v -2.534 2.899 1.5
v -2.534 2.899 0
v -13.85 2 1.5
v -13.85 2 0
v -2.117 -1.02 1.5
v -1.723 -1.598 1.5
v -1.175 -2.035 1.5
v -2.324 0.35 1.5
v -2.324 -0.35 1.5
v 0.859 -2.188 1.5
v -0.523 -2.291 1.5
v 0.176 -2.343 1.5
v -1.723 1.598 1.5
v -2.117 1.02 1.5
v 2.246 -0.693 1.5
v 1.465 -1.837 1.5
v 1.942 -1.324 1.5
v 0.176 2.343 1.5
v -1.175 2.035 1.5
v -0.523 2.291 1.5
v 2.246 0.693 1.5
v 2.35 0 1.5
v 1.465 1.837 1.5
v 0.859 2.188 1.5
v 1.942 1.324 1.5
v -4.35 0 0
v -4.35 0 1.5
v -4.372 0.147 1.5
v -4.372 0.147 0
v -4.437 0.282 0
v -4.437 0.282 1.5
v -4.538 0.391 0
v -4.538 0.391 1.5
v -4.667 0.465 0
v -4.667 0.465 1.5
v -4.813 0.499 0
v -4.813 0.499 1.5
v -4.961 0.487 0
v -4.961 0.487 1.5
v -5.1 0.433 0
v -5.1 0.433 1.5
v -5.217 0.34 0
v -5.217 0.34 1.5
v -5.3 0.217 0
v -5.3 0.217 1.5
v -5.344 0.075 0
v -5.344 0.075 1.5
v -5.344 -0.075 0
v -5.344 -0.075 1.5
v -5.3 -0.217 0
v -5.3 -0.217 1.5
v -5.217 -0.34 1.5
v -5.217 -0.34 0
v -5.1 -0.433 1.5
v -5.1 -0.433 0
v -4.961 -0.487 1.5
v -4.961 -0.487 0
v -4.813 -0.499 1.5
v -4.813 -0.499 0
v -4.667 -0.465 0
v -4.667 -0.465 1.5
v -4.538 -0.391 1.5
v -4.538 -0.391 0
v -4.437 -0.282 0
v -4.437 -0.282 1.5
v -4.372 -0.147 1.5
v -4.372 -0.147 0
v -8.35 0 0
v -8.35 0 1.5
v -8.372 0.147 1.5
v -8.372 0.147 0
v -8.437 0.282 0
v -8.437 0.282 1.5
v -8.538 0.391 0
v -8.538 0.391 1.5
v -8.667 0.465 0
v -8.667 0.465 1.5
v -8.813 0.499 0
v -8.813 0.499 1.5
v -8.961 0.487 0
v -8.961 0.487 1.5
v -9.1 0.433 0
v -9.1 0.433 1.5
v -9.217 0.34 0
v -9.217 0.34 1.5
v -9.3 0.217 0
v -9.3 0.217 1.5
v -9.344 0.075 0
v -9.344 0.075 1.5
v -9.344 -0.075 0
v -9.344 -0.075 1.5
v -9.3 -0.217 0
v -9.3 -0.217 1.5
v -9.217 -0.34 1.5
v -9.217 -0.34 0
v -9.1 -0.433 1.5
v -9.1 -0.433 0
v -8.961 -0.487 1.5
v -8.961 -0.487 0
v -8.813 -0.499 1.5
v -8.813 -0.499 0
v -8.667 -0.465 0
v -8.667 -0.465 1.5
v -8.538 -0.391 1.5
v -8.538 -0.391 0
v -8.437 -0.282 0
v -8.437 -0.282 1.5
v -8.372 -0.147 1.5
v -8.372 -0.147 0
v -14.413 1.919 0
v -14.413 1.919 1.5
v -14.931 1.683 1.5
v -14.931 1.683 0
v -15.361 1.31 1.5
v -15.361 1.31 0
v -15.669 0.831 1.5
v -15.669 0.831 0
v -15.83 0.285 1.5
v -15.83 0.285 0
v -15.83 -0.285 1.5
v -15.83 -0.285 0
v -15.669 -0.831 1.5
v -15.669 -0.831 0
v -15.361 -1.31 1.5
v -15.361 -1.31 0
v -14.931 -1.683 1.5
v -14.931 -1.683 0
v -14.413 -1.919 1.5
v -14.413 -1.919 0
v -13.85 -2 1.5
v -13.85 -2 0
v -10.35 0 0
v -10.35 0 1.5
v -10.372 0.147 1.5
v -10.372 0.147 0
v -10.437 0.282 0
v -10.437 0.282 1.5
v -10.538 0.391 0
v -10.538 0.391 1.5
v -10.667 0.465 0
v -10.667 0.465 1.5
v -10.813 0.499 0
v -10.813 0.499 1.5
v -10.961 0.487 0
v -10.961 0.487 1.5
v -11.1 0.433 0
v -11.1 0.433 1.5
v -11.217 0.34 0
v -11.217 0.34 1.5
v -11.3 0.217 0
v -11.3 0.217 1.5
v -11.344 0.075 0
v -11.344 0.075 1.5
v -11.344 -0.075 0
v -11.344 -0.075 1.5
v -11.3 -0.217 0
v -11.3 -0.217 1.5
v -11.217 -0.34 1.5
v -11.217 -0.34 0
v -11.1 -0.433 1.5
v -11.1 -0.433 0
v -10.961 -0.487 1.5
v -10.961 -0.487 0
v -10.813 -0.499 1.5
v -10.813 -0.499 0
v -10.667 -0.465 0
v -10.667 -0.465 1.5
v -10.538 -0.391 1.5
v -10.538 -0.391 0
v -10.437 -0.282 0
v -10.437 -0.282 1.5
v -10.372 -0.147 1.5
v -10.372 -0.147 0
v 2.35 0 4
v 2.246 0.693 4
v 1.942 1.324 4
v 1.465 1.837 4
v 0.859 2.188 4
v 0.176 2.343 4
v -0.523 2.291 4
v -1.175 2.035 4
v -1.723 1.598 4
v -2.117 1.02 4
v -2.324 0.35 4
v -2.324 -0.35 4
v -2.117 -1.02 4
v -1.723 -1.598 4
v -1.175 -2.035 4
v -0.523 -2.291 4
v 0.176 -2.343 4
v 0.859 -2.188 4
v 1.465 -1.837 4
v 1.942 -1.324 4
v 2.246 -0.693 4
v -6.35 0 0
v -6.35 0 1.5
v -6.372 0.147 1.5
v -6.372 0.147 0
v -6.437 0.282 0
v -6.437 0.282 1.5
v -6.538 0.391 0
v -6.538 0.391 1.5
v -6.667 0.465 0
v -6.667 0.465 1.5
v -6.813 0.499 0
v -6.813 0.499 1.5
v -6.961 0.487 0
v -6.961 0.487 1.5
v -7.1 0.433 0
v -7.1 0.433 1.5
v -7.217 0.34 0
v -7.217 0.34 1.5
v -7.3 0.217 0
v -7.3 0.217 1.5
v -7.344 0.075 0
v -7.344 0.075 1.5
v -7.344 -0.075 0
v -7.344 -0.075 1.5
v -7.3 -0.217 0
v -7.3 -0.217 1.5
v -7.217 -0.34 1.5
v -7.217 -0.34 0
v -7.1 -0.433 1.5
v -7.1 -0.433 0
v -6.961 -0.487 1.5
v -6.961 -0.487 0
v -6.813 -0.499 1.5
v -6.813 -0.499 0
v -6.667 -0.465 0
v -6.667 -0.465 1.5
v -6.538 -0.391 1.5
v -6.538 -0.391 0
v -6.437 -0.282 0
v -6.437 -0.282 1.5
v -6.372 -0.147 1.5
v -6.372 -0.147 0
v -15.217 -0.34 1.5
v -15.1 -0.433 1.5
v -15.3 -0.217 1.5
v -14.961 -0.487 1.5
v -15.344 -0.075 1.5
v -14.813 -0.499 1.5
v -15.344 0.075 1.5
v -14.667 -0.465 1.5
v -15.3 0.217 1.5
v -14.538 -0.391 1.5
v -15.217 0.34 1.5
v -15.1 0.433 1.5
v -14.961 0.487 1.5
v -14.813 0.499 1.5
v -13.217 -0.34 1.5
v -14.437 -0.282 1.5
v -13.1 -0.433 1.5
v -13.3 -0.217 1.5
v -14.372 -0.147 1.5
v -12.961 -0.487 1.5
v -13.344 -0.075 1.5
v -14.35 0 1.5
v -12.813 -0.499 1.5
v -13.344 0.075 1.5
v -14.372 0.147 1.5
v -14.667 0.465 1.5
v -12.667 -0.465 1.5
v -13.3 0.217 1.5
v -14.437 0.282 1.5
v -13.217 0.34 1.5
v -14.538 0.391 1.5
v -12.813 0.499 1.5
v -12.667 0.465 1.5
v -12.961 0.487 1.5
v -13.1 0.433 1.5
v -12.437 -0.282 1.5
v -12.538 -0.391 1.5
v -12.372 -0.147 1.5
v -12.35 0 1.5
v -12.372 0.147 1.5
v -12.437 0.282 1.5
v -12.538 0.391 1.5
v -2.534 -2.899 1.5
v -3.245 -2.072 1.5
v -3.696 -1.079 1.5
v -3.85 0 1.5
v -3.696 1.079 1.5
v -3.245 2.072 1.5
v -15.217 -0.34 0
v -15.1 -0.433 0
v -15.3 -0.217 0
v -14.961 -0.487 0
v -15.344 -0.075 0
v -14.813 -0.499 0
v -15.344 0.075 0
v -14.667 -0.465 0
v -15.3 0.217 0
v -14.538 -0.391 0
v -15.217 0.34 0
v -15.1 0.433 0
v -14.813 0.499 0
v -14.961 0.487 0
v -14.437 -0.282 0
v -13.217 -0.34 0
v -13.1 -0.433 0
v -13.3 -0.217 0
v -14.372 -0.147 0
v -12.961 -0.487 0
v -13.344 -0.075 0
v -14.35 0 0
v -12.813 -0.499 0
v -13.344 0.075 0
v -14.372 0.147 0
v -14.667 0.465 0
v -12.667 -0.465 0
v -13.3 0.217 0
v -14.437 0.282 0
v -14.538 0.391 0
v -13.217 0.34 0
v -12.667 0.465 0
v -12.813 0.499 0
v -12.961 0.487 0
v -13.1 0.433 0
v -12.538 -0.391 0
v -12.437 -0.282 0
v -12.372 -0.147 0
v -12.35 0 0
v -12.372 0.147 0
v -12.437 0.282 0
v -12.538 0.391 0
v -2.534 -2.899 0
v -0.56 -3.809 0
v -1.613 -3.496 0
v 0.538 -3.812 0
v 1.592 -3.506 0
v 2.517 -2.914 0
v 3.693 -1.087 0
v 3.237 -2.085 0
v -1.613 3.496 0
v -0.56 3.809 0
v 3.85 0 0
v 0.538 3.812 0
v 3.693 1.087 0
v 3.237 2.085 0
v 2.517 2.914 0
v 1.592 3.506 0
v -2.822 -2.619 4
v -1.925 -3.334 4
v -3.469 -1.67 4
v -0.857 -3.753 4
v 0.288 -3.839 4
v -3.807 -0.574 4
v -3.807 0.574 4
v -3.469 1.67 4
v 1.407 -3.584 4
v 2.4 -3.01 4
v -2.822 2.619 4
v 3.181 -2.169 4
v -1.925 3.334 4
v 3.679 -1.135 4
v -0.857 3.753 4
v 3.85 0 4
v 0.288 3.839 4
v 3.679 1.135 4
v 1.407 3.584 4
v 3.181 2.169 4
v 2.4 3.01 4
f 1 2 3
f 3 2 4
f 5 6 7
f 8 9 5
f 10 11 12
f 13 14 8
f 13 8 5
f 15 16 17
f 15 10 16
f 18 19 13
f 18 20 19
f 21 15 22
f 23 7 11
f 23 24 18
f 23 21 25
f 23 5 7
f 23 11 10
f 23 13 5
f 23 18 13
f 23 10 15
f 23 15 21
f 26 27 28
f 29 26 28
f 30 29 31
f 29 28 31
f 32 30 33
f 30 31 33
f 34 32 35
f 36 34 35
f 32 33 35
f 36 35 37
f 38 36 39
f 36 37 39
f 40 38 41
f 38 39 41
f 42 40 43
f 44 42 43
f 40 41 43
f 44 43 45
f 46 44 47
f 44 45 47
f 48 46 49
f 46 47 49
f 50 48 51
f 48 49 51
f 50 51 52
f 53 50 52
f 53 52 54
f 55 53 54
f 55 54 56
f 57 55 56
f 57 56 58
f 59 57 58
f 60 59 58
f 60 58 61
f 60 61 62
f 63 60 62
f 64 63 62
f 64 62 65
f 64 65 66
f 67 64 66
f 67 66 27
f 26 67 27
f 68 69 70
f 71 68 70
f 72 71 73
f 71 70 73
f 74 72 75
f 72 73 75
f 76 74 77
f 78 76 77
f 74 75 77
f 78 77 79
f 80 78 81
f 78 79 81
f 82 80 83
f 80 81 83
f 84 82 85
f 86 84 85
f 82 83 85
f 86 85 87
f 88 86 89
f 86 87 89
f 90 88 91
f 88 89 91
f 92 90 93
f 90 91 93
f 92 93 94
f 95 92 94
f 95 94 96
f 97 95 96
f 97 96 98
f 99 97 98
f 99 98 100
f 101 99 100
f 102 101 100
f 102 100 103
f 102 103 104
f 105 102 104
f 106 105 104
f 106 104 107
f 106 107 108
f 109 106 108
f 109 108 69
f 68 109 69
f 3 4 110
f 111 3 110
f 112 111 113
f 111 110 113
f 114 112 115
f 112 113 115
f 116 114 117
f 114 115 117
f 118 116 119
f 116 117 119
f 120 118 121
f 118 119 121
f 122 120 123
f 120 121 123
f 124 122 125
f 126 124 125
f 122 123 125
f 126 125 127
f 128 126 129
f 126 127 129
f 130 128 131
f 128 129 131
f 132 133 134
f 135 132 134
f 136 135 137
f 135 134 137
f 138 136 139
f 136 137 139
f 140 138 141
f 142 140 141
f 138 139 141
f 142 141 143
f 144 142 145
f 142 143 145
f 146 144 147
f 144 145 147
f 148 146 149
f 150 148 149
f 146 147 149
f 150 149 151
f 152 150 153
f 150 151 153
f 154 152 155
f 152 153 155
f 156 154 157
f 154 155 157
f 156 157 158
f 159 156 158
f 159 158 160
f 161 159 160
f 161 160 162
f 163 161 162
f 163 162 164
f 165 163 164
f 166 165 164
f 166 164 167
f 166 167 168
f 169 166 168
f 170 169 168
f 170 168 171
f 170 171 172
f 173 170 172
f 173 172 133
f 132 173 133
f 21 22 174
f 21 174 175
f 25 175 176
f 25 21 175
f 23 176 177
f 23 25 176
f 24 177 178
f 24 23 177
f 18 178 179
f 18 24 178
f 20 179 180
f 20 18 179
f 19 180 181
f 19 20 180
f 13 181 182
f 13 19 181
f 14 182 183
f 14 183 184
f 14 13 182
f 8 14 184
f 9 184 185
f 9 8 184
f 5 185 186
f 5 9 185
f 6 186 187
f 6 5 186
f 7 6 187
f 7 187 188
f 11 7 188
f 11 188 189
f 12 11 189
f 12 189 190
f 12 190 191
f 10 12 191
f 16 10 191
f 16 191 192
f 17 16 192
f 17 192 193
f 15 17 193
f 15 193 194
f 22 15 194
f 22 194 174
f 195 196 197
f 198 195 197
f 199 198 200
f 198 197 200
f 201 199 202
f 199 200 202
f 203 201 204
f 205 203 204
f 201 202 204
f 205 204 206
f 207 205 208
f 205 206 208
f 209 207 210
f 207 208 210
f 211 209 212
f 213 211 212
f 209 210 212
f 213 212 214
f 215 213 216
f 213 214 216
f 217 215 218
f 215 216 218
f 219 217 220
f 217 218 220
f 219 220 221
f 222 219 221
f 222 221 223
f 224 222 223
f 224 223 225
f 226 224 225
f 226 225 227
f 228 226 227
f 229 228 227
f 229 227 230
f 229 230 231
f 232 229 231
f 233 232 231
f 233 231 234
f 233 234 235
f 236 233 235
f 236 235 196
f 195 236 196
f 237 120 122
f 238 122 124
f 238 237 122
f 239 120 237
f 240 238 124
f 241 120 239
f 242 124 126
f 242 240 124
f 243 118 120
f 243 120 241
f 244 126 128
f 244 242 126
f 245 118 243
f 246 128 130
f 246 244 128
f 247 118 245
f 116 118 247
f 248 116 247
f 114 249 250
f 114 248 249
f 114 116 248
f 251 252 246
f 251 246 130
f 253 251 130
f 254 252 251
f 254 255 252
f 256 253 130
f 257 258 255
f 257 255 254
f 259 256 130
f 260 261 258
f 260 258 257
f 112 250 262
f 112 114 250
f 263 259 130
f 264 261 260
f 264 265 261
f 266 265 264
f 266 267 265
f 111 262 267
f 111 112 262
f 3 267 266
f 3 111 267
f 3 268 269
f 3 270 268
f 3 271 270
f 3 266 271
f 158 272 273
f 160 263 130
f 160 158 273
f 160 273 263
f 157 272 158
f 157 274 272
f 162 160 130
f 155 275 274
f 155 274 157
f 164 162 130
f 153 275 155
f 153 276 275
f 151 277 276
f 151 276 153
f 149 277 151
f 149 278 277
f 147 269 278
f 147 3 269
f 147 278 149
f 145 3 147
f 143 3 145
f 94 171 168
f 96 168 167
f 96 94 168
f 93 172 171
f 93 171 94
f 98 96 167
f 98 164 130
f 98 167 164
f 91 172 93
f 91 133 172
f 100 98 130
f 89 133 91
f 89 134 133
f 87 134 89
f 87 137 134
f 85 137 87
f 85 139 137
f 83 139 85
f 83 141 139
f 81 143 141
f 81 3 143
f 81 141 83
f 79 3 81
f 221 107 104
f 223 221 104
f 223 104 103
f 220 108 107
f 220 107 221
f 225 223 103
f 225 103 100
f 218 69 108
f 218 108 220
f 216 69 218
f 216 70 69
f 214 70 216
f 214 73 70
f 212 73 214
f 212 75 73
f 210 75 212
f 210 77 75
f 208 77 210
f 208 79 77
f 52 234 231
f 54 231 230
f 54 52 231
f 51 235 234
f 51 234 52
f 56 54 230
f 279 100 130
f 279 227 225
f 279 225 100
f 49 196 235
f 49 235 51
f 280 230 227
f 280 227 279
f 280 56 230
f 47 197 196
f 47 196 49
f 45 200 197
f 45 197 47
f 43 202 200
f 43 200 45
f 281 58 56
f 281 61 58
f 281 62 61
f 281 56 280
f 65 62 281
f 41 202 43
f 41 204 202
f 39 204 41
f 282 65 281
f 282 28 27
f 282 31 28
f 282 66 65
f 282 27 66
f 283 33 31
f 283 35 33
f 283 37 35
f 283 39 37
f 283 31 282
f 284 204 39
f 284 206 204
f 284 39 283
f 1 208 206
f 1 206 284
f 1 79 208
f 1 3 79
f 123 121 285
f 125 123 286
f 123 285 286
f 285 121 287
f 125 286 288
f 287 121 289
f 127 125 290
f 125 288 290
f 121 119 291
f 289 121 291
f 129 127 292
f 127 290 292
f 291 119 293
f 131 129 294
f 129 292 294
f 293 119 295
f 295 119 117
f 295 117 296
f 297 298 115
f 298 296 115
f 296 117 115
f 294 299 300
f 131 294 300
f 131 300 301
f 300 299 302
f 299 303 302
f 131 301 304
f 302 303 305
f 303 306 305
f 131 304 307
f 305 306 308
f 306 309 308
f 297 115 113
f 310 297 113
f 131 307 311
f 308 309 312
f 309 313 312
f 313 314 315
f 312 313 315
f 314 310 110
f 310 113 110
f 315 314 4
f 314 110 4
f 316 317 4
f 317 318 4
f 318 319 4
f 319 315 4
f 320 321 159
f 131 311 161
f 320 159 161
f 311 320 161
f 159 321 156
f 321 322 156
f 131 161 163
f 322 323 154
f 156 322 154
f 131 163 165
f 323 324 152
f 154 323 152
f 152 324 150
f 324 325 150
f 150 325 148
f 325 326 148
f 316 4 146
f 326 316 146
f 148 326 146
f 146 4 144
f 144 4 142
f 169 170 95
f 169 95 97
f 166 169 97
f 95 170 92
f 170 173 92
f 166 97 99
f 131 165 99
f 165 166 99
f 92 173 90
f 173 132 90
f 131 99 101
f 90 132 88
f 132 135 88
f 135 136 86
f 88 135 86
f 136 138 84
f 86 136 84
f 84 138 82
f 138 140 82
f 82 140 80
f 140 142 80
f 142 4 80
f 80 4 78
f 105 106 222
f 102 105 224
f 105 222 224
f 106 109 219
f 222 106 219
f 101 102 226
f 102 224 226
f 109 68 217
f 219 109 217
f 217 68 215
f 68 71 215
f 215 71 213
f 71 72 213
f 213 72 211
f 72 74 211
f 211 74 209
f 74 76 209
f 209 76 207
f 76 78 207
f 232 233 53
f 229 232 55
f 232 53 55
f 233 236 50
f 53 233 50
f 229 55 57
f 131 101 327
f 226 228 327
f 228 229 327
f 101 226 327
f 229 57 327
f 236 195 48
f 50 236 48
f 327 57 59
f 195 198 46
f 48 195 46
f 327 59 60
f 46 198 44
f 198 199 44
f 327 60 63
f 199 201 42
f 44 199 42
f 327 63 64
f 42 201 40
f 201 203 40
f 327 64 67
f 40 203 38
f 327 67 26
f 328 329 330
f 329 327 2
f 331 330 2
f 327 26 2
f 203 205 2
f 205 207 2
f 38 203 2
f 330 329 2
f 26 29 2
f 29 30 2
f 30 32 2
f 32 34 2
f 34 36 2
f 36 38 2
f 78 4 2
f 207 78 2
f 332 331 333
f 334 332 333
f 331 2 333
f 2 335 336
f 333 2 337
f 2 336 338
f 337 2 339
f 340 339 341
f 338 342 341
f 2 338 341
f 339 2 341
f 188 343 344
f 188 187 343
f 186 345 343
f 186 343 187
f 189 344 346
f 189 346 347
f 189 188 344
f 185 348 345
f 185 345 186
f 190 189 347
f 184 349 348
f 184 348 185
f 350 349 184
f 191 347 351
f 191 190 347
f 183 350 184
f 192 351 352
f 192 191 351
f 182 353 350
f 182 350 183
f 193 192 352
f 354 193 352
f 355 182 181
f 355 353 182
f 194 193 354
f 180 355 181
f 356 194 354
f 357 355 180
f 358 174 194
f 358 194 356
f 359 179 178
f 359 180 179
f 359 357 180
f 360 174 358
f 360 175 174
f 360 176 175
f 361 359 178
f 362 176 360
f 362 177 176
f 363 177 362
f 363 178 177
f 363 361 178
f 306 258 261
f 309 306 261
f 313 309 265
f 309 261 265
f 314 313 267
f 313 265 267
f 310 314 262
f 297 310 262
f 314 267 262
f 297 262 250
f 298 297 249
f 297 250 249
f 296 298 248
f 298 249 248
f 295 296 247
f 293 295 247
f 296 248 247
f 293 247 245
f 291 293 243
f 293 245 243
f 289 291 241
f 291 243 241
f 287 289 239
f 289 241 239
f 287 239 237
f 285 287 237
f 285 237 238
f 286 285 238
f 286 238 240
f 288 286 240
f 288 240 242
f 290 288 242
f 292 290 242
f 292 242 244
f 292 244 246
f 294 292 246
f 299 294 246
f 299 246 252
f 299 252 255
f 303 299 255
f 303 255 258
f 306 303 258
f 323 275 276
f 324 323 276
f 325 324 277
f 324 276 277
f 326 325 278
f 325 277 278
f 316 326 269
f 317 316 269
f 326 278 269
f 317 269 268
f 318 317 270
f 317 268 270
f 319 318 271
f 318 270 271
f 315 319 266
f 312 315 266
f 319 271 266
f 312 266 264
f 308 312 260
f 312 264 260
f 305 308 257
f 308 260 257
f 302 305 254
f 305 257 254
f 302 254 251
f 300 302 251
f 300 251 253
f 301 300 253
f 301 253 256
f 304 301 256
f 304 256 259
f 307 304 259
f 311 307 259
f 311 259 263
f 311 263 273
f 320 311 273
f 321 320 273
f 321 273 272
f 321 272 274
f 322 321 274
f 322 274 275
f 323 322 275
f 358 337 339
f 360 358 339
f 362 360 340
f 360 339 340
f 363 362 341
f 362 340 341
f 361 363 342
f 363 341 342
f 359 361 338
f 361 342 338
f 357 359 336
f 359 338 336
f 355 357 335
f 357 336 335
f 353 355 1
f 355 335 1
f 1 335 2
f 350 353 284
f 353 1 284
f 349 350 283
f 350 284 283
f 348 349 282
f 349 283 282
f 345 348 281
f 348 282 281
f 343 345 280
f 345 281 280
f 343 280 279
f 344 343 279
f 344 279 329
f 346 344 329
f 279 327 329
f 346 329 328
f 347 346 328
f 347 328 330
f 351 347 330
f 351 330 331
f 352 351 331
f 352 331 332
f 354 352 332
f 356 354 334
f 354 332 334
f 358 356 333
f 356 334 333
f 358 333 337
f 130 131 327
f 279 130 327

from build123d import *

# Parameters (mm, degrees)
SCHIZZO1_R                   = 3.85
SCHIZZO1_R_2                 = 2.35
ESTRUSIONE_ESTRUSIONE1_DEPTH = 4
ESTRUSIONE_ESTRUSIONE2_DEPTH = 1.5
TAGLIO_ESTRUSIONE1_REACH     = 18.501
SCHIZZO4_R                   = 0.5


with BuildPart() as part:
    # Schizzo1 → Estrusione-Estrusione1 (new body)
    with BuildSketch(Plane.XY):
        Circle(SCHIZZO1_R)
        Circle(SCHIZZO1_R_2, mode=Mode.SUBTRACT)
    extrude(amount=ESTRUSIONE_ESTRUSIONE1_DEPTH)

    # Schizzo3 → Estrusione-Estrusione2 (add)
    with BuildSketch(Plane(origin=(0, 0, 0), x_dir=(-1, 0, 0), z_dir=(0, 0, -1))):
        with BuildLine():
            Line((0, 3.1), (13.85, 2))
            ThreePointArc((13.85, 2), (15.85, 0), (13.85, -2))
            Line((13.85, -2), (0, -3.1))
            ThreePointArc((0, -3.1), (-3.1, 0), (0, 3.1))
        make_face()
    extrude(amount=-ESTRUSIONE_ESTRUSIONE2_DEPTH)

    # Schizzo4 → Taglio-Estrusione1 (cut, up to next)
    with BuildSketch(Plane.XY.offset(1.5), mode=Mode.PRIVATE) as taglio_estrusione1_sk1:
        with Locations((-4.85, 0)):
            Circle(SCHIZZO4_R)
    taglio_estrusione1_tool1 = extrude(taglio_estrusione1_sk1.sketch, amount=-TAGLIO_ESTRUSIONE1_REACH, mode=Mode.PRIVATE) & part.part
    # Schizzo4 → Taglio-Estrusione1 (cut, up to next)
    with BuildSketch(Plane.XY.offset(1.5), mode=Mode.PRIVATE) as taglio_estrusione1_sk2:
        with Locations((-6.85, 0)):
            Circle(SCHIZZO4_R)
    taglio_estrusione1_tool2 = extrude(taglio_estrusione1_sk2.sketch, amount=-TAGLIO_ESTRUSIONE1_REACH, mode=Mode.PRIVATE) & part.part
    # Schizzo4 → Taglio-Estrusione1 (cut, up to next)
    with BuildSketch(Plane.XY.offset(1.5), mode=Mode.PRIVATE) as taglio_estrusione1_sk3:
        with Locations((-8.85, 0)):
            Circle(SCHIZZO4_R)
    taglio_estrusione1_tool3 = extrude(taglio_estrusione1_sk3.sketch, amount=-TAGLIO_ESTRUSIONE1_REACH, mode=Mode.PRIVATE) & part.part
    # Schizzo4 → Taglio-Estrusione1 (cut, up to next)
    with BuildSketch(Plane.XY.offset(1.5), mode=Mode.PRIVATE) as taglio_estrusione1_sk4:
        with Locations((-10.85, 0)):
            Circle(SCHIZZO4_R)
    taglio_estrusione1_tool4 = extrude(taglio_estrusione1_sk4.sketch, amount=-TAGLIO_ESTRUSIONE1_REACH, mode=Mode.PRIVATE) & part.part
    # Schizzo4 → Taglio-Estrusione1 (cut, up to next)
    with BuildSketch(Plane.XY.offset(1.5), mode=Mode.PRIVATE) as taglio_estrusione1_sk5:
        with Locations((-12.85, 0)):
            Circle(SCHIZZO4_R)
    taglio_estrusione1_tool5 = extrude(taglio_estrusione1_sk5.sketch, amount=-TAGLIO_ESTRUSIONE1_REACH, mode=Mode.PRIVATE) & part.part
    # Schizzo4 → Taglio-Estrusione1 (cut, up to next)
    with BuildSketch(Plane.XY.offset(1.5), mode=Mode.PRIVATE) as taglio_estrusione1_sk6:
        with Locations((-14.85, 0)):
            Circle(SCHIZZO4_R)
    taglio_estrusione1_tool6 = extrude(taglio_estrusione1_sk6.sketch, amount=-TAGLIO_ESTRUSIONE1_REACH, mode=Mode.PRIVATE) & part.part
    add(taglio_estrusione1_tool1.solids().sort_by_distance((-4.85, 0, 1.5))[0], mode=Mode.SUBTRACT)
    add(taglio_estrusione1_tool2.solids().sort_by_distance((-6.85, 0, 1.5))[0], mode=Mode.SUBTRACT)
    add(taglio_estrusione1_tool3.solids().sort_by_distance((-8.85, 0, 1.5))[0], mode=Mode.SUBTRACT)
    add(taglio_estrusione1_tool4.solids().sort_by_distance((-10.85, 0, 1.5))[0], mode=Mode.SUBTRACT)
    add(taglio_estrusione1_tool5.solids().sort_by_distance((-12.85, 0, 1.5))[0], mode=Mode.SUBTRACT)
    add(taglio_estrusione1_tool6.solids().sort_by_distance((-14.85, 0, 1.5))[0], mode=Mode.SUBTRACT)


solid = part.part
